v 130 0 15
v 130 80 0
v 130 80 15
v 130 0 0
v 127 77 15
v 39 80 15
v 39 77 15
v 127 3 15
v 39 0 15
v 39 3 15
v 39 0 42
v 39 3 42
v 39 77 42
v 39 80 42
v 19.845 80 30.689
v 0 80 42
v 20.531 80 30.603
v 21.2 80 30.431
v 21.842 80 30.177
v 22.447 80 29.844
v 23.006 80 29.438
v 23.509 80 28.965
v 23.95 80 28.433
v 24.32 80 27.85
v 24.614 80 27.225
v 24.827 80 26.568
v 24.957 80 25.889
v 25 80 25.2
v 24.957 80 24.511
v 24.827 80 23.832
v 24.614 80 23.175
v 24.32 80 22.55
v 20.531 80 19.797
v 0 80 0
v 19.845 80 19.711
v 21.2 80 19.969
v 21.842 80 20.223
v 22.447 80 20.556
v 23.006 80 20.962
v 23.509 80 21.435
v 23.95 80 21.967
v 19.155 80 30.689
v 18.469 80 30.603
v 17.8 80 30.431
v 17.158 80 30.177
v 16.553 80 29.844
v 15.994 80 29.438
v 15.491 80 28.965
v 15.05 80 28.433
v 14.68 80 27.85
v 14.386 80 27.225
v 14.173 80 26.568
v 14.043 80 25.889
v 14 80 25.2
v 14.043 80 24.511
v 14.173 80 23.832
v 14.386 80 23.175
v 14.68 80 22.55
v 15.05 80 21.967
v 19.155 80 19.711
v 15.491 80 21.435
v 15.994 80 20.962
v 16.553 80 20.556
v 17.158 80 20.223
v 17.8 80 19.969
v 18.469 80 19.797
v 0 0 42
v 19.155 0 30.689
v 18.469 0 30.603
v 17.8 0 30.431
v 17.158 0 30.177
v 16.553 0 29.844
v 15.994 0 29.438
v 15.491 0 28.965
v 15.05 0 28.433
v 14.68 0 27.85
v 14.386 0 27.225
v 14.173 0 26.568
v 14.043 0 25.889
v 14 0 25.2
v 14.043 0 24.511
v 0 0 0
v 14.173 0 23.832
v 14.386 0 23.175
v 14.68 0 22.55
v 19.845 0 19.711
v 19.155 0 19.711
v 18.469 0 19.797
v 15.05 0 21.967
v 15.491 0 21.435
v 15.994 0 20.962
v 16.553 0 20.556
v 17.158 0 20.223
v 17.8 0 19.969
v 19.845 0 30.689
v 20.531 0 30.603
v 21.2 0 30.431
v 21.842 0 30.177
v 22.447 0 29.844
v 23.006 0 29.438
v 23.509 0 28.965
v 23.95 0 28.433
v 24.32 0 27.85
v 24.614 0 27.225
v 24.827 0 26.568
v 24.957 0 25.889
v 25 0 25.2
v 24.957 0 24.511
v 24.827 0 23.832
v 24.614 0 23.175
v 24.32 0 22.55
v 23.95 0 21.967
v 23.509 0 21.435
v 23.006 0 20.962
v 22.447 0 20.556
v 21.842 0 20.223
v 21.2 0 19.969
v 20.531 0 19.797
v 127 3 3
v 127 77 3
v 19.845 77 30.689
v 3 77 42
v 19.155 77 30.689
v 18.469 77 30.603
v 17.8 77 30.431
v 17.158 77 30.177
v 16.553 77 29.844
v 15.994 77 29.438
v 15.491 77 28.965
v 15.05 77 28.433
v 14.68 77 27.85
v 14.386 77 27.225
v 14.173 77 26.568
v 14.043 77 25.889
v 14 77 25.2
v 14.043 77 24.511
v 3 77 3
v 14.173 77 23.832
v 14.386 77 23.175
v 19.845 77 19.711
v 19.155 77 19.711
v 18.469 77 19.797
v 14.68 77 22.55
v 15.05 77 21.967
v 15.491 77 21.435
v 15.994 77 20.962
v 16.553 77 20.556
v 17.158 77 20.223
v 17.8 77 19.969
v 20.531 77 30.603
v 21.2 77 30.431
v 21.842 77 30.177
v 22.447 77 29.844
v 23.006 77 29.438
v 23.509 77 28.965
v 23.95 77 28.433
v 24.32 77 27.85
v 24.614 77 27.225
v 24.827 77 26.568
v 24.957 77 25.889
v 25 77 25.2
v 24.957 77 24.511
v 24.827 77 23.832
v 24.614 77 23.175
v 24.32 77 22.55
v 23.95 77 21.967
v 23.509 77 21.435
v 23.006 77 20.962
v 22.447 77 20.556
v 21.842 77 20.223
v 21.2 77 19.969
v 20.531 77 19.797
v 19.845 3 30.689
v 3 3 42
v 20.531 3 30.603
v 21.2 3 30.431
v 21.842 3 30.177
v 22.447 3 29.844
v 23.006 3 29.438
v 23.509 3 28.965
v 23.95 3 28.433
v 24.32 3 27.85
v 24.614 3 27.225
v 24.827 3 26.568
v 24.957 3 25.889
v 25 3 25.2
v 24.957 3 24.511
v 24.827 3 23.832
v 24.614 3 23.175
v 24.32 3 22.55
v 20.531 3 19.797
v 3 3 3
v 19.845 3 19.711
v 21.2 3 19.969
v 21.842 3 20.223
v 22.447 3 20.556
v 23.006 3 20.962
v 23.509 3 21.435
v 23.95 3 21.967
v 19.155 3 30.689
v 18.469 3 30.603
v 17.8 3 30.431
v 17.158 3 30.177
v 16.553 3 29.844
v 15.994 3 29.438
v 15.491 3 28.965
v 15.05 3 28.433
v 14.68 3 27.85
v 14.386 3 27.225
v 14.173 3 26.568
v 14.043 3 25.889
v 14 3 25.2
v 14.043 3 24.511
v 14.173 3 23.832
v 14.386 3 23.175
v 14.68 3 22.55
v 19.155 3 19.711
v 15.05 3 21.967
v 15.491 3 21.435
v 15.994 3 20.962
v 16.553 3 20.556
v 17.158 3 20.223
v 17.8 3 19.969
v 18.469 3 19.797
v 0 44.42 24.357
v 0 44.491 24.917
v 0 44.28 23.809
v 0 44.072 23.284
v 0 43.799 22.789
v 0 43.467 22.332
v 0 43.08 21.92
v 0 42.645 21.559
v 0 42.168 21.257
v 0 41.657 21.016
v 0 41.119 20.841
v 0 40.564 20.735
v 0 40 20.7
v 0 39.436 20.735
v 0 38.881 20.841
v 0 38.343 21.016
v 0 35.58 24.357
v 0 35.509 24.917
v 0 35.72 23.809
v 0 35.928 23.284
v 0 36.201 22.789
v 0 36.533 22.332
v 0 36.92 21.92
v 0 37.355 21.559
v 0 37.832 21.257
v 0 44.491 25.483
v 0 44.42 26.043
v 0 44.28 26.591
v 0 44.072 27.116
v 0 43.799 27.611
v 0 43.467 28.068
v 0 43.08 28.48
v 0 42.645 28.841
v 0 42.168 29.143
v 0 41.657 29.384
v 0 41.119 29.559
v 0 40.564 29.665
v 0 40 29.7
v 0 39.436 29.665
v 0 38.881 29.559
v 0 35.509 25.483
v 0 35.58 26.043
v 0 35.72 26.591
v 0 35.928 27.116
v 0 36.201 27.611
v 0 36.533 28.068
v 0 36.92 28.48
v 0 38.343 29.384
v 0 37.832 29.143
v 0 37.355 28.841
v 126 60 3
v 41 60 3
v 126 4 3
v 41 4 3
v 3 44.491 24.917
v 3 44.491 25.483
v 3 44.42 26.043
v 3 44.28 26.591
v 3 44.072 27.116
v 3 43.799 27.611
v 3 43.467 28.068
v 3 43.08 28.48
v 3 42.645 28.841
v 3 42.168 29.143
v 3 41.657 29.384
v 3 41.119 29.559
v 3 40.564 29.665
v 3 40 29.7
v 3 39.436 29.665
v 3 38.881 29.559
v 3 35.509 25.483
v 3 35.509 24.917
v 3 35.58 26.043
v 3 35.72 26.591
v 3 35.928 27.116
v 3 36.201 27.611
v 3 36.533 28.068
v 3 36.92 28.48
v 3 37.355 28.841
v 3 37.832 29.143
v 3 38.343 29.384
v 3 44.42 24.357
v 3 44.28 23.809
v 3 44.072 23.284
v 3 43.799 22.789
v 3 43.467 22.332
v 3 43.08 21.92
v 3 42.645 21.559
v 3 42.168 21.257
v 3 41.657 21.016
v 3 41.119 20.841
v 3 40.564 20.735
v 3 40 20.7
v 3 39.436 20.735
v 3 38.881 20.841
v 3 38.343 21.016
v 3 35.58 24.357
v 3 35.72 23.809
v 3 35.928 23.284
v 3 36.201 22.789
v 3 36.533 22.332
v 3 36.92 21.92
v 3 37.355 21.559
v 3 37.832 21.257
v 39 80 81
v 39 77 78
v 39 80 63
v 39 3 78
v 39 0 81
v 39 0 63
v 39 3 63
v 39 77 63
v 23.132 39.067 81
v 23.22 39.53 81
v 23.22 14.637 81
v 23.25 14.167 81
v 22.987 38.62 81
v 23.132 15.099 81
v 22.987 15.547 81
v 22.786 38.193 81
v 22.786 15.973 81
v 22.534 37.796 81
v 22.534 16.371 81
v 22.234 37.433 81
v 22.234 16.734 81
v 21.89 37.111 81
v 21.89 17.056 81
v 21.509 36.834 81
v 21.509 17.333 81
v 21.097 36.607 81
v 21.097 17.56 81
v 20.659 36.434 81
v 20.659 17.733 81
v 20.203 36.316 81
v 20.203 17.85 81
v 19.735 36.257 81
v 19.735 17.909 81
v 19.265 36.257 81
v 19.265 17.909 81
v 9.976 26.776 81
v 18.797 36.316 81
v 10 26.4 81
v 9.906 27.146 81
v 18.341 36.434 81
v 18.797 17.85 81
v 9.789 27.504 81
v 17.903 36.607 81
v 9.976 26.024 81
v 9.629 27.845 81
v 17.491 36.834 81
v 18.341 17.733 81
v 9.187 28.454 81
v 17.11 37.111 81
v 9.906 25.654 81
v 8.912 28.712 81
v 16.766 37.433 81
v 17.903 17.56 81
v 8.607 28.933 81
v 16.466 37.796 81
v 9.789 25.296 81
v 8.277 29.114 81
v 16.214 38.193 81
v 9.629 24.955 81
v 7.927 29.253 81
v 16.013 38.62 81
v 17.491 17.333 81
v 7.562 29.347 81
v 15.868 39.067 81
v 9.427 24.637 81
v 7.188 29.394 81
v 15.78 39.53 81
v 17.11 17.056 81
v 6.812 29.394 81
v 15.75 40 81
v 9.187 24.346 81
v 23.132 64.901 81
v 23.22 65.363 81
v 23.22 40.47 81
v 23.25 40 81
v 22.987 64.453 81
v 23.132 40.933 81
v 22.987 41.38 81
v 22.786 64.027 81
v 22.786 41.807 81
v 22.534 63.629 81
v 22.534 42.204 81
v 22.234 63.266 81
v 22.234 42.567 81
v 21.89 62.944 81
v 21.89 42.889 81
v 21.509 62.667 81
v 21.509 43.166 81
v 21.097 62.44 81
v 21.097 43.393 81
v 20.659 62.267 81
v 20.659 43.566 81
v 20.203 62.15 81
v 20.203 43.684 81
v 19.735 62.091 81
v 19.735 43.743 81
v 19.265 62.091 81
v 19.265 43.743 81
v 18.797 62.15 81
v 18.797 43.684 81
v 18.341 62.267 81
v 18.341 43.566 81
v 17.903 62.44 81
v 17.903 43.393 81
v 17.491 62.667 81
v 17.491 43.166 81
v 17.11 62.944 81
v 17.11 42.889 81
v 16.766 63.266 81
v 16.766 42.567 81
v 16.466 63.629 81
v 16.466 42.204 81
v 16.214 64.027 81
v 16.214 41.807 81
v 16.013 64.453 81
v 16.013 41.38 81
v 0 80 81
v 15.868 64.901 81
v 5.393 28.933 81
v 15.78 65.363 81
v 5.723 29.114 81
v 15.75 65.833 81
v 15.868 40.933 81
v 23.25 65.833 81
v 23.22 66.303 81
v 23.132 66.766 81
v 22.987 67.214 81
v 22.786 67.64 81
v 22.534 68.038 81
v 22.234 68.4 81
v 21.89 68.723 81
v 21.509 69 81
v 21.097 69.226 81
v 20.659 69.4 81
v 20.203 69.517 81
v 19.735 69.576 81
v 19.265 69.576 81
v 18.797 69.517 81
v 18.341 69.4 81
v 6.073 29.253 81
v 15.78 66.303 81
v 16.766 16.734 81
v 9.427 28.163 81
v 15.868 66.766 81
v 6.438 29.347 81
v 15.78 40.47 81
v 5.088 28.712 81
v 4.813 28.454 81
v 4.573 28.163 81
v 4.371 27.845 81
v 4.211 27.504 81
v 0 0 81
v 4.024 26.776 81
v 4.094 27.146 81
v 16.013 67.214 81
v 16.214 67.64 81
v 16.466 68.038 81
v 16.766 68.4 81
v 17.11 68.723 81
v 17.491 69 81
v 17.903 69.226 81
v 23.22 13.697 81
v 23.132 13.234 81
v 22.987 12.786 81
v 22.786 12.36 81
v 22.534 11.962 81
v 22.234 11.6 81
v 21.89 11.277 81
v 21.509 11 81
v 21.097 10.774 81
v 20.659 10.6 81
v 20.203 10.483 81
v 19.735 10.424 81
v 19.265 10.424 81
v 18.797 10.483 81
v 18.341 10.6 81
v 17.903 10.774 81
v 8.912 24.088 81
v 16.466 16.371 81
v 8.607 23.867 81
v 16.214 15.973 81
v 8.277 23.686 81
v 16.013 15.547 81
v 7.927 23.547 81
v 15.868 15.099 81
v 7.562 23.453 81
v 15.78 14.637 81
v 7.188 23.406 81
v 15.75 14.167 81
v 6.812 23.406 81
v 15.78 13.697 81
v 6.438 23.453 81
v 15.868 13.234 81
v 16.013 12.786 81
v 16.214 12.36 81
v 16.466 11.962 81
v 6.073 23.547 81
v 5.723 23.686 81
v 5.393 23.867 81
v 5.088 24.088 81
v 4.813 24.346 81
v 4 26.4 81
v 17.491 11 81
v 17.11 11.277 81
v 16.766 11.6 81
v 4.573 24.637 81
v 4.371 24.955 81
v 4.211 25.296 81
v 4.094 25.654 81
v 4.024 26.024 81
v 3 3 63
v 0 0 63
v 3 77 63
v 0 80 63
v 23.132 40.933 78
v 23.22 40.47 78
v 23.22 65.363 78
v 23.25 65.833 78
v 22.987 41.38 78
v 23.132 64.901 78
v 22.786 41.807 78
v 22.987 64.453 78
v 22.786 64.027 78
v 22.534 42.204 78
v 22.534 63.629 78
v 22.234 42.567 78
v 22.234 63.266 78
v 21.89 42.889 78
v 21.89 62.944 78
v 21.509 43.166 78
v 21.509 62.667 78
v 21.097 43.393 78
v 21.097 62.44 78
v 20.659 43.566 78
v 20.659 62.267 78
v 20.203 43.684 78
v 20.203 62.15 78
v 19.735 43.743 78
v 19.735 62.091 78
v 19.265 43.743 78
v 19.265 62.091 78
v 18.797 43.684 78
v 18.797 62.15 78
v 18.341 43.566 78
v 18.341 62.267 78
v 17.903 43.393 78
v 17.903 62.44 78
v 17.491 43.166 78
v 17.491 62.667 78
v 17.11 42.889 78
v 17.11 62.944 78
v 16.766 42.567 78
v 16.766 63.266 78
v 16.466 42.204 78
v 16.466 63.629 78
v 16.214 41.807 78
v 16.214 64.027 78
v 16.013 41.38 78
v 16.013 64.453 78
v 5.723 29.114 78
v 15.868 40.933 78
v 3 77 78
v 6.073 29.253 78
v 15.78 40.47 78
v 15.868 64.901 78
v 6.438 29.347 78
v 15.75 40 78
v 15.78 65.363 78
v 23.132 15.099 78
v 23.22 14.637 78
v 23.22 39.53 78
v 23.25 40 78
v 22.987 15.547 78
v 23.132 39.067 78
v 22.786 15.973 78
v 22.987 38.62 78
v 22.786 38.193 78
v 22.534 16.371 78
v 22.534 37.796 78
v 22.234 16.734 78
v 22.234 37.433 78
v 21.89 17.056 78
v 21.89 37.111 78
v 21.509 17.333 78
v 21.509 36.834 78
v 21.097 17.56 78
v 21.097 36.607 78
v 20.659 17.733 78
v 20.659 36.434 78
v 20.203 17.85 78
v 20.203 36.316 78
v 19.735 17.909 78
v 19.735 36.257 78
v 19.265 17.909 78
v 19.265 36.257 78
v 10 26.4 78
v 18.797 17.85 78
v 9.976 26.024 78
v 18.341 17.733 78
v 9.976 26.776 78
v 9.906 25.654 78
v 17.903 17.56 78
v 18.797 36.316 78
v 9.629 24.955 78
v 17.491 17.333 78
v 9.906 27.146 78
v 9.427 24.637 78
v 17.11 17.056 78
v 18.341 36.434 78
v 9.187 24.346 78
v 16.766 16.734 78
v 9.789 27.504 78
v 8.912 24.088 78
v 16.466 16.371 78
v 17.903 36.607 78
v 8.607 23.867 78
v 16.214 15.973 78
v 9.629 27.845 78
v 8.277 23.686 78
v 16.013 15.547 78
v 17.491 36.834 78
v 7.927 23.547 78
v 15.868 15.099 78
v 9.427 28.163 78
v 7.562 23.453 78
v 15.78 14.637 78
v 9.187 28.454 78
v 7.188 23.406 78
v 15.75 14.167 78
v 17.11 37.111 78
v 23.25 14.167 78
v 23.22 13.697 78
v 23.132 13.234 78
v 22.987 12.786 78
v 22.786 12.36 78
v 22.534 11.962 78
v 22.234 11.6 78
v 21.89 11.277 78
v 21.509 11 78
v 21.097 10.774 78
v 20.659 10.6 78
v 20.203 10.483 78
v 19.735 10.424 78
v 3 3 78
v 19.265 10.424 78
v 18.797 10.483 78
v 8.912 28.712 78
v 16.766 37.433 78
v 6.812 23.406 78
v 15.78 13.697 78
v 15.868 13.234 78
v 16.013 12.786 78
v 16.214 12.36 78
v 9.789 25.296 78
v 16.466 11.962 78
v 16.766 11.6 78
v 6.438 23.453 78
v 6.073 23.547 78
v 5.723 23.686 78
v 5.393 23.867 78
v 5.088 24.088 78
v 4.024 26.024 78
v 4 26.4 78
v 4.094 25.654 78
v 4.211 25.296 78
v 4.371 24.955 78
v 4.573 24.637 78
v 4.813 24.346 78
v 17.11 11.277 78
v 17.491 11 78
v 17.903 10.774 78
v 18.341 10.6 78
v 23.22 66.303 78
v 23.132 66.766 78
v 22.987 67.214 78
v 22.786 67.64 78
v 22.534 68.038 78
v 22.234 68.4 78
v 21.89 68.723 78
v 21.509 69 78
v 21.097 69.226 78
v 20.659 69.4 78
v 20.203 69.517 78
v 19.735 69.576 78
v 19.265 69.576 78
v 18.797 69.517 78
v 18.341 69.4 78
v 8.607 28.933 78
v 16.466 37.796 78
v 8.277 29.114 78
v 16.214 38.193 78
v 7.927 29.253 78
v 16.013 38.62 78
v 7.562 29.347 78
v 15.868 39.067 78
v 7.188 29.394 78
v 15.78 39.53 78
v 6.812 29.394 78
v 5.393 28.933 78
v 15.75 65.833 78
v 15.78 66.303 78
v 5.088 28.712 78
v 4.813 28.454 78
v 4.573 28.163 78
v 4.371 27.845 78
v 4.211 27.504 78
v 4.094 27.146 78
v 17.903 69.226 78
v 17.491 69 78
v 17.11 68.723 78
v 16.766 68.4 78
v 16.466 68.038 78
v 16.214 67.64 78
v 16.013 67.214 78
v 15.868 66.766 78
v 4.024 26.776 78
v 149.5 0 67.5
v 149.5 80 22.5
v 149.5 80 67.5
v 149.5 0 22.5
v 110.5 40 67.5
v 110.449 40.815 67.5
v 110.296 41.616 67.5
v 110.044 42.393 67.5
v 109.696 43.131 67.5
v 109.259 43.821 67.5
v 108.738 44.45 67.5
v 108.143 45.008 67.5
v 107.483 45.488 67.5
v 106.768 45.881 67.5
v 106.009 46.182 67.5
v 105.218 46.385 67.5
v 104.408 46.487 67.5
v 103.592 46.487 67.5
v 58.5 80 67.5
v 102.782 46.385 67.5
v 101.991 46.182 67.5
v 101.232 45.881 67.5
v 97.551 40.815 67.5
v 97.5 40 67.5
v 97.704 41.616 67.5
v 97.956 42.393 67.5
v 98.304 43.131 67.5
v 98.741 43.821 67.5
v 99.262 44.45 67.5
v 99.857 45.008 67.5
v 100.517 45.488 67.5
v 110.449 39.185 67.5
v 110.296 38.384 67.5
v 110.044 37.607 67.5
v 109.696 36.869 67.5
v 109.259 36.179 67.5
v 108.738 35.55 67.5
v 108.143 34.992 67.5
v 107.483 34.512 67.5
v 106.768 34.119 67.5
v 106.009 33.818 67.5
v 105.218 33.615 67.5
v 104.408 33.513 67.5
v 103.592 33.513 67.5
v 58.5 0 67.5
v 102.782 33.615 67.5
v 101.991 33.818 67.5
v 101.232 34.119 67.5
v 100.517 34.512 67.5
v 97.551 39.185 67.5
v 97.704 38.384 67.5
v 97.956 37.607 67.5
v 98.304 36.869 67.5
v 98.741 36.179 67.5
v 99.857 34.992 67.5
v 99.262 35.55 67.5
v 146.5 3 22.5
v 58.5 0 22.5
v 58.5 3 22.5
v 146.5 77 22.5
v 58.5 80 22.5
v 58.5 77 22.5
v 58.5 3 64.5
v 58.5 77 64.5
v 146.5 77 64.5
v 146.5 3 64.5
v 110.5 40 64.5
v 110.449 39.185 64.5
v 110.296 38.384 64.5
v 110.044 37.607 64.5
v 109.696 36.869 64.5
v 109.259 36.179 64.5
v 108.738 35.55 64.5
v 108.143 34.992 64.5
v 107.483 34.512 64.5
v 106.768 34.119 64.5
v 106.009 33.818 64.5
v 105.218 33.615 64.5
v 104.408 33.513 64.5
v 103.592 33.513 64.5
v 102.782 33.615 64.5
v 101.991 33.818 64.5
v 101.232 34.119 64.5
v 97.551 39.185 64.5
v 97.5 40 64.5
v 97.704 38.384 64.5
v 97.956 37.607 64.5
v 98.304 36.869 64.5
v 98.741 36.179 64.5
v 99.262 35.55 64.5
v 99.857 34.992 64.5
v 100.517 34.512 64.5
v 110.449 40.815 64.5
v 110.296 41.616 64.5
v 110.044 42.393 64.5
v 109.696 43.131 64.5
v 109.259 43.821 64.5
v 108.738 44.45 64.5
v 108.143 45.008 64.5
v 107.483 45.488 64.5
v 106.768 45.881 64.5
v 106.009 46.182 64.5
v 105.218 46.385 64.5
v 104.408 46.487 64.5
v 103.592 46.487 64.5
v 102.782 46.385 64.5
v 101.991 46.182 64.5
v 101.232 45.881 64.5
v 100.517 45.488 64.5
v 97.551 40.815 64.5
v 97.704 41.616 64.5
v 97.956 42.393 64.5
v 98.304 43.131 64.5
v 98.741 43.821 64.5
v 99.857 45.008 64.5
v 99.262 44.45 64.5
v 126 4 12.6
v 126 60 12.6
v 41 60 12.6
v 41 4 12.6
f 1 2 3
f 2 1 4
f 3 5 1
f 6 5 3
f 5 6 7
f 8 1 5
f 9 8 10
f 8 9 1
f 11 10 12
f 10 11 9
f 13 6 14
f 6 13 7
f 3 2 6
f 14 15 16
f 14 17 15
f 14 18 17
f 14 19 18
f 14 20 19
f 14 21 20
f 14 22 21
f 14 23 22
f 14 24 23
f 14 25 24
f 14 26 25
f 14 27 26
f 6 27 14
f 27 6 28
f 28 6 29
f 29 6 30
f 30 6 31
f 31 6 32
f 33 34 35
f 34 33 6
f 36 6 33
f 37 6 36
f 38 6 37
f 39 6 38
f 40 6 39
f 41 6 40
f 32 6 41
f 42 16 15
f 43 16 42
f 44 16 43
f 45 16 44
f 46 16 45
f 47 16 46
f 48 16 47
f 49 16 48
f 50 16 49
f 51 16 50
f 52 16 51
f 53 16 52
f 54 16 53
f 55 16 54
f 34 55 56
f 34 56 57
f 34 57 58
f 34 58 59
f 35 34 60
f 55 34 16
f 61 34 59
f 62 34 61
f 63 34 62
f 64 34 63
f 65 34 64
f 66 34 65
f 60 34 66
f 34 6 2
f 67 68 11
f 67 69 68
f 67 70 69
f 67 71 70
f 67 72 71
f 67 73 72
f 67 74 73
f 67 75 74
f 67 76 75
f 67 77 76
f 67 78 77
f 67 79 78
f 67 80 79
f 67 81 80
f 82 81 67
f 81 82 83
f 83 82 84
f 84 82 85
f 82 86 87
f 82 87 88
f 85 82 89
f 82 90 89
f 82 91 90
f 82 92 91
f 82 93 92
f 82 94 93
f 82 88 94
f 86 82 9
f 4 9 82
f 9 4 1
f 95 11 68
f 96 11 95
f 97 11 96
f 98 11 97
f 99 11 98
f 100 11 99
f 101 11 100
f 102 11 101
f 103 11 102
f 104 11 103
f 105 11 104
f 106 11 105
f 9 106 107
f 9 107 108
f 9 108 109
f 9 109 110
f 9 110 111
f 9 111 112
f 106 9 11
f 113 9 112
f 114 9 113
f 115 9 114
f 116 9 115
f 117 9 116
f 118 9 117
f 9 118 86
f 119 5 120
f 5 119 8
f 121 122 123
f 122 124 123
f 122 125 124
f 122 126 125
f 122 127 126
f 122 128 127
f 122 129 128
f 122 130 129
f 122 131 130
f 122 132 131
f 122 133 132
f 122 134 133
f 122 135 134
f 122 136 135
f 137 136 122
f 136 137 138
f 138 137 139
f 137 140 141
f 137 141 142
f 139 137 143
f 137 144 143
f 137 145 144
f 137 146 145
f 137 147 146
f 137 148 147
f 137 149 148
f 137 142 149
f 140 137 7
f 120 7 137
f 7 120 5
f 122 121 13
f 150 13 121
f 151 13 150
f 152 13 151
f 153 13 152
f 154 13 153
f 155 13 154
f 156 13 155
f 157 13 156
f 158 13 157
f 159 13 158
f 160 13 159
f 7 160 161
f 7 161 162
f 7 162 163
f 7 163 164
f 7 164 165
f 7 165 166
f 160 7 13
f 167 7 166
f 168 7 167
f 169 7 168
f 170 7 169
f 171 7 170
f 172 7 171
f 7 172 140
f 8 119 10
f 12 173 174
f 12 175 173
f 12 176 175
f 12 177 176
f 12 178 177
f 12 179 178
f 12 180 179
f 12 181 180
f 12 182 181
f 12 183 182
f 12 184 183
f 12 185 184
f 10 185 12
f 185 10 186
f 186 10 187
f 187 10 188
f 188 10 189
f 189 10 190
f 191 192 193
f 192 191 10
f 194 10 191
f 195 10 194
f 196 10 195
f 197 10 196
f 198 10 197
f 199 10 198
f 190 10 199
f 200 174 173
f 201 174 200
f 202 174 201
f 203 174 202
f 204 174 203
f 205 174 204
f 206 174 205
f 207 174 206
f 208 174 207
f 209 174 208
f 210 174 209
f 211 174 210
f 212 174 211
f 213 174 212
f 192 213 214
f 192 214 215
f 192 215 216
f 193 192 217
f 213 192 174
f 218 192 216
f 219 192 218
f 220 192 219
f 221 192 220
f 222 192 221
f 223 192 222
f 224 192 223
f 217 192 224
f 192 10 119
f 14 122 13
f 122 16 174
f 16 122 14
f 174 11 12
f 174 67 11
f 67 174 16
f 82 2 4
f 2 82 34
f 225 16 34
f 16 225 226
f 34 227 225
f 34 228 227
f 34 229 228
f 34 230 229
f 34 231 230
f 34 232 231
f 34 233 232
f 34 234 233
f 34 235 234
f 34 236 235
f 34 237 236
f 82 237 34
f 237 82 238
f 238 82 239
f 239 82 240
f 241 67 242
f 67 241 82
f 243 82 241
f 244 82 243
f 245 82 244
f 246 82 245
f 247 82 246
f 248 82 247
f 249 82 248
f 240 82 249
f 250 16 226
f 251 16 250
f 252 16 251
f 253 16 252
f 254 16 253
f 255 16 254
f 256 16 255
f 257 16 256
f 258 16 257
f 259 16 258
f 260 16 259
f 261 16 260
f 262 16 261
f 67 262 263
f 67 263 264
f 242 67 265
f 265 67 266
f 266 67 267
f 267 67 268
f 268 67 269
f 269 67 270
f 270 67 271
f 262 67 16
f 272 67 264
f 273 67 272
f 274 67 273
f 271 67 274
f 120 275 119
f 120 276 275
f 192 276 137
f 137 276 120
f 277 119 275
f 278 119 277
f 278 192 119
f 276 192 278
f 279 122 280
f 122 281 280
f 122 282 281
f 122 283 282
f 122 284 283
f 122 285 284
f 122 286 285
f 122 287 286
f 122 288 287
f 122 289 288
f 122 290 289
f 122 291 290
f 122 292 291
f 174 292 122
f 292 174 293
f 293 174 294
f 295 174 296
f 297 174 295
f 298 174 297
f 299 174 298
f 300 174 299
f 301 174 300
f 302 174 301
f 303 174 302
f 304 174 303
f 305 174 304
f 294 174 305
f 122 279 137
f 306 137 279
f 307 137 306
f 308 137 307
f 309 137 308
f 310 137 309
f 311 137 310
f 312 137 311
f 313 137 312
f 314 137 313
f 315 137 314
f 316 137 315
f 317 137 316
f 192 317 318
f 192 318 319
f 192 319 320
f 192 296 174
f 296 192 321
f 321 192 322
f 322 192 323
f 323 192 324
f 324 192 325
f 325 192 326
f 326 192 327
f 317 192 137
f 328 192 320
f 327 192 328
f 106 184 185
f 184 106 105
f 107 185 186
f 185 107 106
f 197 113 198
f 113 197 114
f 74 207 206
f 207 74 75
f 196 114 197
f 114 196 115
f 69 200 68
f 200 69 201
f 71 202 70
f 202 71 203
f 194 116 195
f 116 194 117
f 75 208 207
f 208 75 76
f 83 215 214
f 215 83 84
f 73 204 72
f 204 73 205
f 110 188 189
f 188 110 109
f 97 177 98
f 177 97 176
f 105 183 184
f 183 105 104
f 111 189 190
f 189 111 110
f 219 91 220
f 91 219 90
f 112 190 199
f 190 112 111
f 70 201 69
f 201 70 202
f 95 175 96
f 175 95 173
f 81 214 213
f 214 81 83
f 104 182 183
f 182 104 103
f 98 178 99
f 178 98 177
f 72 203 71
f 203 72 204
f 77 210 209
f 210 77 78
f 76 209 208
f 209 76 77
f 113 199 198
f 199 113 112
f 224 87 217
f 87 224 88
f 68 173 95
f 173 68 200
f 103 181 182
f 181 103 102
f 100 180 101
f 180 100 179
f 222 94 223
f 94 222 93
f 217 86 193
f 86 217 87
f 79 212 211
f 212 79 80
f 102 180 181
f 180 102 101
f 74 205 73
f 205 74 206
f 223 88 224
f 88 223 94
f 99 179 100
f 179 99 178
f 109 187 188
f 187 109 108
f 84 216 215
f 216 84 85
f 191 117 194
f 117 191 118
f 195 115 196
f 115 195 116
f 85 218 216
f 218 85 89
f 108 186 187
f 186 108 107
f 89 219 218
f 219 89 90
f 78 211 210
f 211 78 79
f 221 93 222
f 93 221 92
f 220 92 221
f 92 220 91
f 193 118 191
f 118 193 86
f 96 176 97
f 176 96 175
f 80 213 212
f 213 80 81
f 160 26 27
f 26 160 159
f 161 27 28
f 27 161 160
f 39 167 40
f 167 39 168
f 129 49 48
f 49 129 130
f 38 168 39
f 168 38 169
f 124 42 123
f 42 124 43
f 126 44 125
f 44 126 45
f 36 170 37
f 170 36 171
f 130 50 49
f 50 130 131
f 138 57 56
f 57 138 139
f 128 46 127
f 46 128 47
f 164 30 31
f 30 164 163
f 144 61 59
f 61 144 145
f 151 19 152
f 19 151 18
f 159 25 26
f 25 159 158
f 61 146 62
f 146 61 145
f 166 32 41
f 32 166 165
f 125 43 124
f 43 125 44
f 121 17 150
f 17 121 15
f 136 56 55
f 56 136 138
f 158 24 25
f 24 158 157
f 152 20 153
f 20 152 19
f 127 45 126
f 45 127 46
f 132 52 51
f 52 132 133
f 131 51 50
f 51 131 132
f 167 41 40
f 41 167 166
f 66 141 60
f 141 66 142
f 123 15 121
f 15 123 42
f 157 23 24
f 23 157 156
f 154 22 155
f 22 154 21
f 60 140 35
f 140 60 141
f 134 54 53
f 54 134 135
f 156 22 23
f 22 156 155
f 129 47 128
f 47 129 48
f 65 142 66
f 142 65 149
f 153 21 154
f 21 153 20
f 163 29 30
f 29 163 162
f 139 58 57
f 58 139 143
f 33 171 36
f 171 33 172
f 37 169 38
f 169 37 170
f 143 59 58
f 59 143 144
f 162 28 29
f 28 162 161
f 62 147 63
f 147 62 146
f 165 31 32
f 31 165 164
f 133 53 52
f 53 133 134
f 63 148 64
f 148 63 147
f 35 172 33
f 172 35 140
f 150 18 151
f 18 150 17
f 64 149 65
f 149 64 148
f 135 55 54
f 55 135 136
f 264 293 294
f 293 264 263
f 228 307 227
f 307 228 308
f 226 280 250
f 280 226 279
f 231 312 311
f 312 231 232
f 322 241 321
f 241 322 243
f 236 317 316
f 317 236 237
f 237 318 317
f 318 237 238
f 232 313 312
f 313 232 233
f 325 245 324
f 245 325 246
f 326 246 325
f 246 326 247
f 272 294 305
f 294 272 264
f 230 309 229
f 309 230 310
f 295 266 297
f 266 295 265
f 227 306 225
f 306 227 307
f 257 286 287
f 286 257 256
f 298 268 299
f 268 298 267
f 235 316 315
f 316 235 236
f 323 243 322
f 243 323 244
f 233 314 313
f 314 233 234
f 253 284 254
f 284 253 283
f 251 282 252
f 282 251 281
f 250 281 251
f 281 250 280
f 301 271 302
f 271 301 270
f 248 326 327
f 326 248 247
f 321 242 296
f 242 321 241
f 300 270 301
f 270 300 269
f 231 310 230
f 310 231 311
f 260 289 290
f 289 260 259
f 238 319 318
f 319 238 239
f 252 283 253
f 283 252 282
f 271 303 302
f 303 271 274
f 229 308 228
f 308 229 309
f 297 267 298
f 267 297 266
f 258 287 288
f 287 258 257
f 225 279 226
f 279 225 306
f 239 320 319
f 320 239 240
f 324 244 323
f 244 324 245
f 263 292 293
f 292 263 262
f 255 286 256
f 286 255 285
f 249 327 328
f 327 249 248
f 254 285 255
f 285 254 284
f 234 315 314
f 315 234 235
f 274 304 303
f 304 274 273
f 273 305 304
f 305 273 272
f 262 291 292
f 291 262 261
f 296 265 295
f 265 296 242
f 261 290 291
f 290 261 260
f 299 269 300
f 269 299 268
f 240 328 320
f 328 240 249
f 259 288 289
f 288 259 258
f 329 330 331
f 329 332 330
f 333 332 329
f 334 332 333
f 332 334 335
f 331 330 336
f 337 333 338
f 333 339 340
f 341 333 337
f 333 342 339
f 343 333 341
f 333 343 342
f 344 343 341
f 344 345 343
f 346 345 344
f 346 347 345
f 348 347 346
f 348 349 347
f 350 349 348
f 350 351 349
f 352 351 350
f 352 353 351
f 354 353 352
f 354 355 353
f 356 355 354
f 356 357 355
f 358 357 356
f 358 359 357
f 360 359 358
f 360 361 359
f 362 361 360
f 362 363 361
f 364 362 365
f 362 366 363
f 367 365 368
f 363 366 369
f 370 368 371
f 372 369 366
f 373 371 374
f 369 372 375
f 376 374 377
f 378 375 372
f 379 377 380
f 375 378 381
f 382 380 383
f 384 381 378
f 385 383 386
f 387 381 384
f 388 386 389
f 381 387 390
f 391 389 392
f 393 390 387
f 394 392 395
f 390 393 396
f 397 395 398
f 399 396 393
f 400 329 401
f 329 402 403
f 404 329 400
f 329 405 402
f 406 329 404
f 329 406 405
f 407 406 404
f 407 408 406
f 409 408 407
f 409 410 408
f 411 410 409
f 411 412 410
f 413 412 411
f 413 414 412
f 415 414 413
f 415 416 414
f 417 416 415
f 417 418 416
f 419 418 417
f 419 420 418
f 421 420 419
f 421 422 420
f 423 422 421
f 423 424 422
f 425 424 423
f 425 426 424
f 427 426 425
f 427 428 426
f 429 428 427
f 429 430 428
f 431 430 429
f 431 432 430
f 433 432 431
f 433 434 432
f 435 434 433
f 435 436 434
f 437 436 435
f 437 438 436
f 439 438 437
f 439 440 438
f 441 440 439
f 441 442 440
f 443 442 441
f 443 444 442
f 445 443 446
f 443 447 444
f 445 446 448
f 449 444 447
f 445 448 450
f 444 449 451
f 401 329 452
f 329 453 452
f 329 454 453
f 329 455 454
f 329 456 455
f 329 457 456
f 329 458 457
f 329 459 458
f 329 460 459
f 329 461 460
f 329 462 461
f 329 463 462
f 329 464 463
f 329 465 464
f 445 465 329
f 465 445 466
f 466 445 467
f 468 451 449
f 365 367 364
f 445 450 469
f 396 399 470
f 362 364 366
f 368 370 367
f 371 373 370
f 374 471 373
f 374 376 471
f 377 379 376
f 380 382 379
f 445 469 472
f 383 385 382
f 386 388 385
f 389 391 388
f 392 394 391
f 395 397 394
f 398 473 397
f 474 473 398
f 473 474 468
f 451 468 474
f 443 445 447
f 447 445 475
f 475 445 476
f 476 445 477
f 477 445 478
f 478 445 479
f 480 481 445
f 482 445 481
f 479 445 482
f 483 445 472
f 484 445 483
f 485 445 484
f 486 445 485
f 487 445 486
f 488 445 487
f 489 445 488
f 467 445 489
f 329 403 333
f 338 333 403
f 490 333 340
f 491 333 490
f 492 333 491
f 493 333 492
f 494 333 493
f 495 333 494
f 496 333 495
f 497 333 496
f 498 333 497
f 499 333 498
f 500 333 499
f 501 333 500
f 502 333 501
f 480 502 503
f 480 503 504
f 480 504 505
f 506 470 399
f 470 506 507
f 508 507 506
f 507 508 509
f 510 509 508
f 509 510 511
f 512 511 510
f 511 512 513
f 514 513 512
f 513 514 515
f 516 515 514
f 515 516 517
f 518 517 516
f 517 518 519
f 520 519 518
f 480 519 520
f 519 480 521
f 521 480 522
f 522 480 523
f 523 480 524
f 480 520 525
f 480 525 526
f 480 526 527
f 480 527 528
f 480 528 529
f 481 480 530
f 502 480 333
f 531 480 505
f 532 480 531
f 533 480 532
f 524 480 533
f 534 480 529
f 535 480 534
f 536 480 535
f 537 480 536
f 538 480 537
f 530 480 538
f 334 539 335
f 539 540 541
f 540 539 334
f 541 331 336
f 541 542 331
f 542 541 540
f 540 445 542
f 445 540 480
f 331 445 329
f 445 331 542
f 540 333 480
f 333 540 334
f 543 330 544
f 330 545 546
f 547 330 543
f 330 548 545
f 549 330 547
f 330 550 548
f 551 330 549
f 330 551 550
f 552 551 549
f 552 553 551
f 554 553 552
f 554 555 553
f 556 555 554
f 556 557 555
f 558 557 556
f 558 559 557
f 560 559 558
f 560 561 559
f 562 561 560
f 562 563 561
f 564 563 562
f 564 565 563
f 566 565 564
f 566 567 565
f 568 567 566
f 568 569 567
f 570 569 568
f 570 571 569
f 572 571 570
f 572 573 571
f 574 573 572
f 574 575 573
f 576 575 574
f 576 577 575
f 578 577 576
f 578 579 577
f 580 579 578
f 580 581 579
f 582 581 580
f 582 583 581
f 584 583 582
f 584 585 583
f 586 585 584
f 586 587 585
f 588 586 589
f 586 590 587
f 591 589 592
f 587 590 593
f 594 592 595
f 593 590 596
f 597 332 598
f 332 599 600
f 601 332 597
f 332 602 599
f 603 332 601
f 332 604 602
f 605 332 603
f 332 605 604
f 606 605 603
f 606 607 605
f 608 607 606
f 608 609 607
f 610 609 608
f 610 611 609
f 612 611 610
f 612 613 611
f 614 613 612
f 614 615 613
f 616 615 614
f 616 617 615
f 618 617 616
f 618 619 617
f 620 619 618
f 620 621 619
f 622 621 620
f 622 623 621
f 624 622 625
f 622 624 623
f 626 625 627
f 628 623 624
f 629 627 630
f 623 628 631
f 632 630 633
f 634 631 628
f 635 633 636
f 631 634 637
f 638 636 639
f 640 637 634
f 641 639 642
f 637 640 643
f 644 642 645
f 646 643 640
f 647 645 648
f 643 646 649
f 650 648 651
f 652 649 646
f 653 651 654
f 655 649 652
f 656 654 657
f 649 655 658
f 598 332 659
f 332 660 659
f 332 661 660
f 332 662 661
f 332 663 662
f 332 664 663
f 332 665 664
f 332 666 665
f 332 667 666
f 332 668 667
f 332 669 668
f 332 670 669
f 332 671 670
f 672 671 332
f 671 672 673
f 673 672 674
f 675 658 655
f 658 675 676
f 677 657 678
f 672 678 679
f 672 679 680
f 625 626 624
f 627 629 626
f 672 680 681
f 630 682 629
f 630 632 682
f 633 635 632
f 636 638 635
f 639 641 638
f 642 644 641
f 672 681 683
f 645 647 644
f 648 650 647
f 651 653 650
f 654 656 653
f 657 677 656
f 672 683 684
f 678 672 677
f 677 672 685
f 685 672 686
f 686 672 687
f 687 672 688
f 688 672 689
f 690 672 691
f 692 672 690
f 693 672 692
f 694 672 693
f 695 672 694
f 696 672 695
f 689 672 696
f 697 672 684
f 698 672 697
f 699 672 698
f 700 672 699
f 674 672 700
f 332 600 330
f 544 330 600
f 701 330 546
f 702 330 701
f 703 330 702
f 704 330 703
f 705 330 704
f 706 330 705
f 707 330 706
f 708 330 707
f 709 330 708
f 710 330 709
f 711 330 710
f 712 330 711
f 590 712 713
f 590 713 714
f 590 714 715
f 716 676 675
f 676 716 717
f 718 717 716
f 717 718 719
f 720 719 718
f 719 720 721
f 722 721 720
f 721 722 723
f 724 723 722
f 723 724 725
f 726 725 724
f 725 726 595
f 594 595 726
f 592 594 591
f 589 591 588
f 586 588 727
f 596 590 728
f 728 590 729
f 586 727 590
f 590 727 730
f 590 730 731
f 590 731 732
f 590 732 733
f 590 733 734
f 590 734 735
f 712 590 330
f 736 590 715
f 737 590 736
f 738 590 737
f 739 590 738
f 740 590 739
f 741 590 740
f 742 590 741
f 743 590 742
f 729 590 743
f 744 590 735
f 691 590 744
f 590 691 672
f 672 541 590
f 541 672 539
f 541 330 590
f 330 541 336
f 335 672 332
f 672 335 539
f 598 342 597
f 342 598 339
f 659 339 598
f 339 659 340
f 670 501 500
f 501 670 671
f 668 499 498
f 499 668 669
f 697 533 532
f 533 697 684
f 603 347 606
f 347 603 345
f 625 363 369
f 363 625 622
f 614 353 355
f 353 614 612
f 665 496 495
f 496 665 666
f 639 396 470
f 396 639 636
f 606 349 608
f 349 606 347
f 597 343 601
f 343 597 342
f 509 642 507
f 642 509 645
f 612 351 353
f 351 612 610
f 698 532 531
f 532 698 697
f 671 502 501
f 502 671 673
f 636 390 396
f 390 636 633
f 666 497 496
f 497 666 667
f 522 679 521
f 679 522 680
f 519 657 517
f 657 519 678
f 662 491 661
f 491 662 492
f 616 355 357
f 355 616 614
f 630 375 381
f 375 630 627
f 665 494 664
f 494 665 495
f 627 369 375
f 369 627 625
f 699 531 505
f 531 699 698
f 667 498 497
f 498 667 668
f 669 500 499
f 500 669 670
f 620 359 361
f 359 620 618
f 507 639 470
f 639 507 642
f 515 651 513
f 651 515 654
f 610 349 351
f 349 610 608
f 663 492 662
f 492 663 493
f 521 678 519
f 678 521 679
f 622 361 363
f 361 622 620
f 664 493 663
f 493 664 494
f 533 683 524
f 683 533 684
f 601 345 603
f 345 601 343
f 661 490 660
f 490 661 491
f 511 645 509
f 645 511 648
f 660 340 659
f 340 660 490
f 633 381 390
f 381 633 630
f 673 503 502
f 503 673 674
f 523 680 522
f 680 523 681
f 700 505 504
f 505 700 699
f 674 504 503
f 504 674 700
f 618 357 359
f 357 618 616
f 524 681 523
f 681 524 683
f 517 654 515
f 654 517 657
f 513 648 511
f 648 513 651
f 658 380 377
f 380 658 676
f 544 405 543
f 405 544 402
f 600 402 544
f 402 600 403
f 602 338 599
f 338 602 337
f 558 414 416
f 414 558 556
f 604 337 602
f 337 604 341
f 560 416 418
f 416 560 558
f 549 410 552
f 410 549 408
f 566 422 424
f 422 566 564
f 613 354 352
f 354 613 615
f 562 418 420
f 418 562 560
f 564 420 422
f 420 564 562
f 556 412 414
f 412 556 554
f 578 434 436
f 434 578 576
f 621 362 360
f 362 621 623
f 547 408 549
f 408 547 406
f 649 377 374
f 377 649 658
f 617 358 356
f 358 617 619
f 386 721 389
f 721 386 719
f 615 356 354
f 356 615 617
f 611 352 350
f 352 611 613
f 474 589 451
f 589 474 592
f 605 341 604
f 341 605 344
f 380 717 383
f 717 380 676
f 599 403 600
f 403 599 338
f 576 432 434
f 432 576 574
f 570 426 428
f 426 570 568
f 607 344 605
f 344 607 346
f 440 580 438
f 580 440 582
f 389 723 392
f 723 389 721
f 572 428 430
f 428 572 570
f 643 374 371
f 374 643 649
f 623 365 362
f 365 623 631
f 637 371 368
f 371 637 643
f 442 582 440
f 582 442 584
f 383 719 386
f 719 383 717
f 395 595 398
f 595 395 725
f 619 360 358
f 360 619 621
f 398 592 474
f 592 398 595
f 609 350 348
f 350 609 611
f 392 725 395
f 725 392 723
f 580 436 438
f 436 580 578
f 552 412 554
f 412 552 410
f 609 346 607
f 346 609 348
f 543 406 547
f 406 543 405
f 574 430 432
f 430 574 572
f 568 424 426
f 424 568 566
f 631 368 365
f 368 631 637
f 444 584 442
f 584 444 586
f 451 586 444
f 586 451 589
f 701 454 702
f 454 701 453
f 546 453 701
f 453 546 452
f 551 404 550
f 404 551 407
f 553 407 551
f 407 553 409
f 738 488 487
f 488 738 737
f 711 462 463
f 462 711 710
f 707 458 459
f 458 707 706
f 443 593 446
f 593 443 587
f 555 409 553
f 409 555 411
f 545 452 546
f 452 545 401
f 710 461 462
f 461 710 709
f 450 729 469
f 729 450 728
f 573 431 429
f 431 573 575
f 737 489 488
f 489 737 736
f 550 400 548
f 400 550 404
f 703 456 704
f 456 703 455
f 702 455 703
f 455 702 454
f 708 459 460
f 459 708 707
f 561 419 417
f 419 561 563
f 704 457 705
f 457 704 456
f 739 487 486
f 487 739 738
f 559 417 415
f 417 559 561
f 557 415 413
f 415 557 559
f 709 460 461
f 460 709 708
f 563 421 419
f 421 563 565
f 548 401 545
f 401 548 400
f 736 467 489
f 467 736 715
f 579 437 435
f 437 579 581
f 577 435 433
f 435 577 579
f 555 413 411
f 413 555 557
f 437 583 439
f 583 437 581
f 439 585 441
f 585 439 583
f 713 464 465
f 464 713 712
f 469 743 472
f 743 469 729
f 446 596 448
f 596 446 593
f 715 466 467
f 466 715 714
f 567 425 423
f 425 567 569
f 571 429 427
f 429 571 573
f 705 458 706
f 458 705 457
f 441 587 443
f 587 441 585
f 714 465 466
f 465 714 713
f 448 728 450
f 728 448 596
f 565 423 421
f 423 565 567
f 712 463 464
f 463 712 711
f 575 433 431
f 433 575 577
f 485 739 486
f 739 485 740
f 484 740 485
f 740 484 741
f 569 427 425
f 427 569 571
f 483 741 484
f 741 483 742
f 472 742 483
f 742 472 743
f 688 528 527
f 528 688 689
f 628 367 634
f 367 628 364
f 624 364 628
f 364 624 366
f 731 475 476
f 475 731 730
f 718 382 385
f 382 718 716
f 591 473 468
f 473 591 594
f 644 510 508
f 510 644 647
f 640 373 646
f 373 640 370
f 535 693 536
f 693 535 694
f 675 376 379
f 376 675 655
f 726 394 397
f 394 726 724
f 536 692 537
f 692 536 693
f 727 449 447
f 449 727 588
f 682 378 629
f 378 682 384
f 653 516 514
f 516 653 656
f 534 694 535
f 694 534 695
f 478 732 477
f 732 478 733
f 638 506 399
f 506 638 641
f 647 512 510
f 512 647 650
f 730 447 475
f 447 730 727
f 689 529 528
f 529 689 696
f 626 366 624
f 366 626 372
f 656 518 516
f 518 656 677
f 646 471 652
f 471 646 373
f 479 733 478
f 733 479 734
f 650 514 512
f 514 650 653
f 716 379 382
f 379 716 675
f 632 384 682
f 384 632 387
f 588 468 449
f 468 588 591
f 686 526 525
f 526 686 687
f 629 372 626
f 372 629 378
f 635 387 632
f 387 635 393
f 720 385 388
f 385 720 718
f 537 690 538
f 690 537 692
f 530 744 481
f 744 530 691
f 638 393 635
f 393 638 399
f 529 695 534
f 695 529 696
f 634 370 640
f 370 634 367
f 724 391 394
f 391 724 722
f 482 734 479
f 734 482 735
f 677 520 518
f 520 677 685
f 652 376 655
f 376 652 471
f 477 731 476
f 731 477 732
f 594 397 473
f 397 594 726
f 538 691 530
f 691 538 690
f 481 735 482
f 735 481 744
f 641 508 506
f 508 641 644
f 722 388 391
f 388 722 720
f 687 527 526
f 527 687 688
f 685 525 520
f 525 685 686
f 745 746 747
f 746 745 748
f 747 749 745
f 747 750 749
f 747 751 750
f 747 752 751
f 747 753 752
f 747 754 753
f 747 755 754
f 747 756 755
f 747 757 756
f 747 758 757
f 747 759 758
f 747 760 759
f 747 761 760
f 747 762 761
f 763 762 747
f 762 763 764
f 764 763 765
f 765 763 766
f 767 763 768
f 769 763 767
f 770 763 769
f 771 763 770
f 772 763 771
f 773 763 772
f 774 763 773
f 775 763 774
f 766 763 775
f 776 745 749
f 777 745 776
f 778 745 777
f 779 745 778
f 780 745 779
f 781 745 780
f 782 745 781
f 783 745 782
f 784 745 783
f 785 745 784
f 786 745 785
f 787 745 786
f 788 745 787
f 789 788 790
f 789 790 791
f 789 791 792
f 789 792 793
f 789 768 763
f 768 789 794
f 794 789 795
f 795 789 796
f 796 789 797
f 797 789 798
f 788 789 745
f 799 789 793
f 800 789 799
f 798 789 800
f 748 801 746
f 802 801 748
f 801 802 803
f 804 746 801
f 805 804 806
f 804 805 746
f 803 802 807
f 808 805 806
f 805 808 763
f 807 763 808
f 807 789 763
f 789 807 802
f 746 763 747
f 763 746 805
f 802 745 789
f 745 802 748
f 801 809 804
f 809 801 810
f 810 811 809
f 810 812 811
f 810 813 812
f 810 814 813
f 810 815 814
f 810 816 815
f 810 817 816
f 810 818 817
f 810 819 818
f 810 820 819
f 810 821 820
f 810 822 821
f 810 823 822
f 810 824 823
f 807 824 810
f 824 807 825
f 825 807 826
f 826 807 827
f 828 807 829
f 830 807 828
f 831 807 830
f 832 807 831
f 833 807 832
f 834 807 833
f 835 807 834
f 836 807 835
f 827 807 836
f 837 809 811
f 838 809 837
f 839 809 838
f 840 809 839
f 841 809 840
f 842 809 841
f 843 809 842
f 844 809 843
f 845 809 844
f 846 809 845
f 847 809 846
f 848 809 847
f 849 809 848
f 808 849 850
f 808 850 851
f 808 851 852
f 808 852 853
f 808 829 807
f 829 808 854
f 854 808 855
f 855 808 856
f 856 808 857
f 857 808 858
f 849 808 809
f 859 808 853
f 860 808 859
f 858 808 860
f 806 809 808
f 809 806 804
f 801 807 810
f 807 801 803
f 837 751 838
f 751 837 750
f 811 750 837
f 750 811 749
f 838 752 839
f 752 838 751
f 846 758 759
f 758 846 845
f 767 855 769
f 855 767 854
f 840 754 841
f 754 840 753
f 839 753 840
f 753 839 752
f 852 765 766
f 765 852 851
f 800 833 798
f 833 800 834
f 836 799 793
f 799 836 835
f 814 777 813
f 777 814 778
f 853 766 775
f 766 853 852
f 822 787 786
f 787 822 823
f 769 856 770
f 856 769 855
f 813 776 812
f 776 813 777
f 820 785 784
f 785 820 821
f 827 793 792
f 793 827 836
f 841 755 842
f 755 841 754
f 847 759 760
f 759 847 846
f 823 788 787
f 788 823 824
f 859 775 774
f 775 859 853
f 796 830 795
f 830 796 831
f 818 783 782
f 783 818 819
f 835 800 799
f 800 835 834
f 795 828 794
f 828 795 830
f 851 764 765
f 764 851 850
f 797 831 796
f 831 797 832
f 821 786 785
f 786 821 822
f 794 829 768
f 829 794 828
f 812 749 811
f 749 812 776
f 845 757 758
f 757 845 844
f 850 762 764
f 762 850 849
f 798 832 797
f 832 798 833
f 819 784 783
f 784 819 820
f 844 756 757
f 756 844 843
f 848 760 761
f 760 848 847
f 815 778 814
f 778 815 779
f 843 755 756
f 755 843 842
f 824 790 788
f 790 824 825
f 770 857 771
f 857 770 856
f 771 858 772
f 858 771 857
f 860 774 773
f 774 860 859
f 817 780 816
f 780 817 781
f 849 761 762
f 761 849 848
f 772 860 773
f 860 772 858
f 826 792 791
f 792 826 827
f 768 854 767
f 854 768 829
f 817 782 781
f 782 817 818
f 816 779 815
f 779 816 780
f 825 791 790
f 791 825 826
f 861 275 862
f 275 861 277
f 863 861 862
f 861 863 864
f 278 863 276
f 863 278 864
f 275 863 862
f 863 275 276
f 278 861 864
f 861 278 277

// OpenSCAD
/*

    breadboard dimensions (incl. extension tabs)
    length: 85
    width: 56
    height: 9.6
    
    TODO: measure actual potentiometer dimensions
    TODO: measure actual 1/4" jack dimensions
    TODO: measure actual power jack dimensions
    TODO: measure actual knob dimensions
    TODO: measure actual footswitch dimensions
    
    starting point for overall pedal dimensions
    length: 127 // 5 inches
    width: 76   // 3 inches
    height: 80  // ??? inches
    
*/

OVERALL_LENGTH = 130;
OVERALL_WIDTH = 80;             // TODO: consider making wide enough for a 9v battery
OVERALL_HEIGHT = 60; // 80;

WALL_THICKNESS = 3;
TOLERANCE = 1;

PHONE_JACK_OPENING = 10;        // 9.53 actual
POWER_JACK_OPENING = 8;
POT_BODY_DIAMETER = 25;
POT_SHAFT_DIAMETER = 6.5;
FOOTSWITCH_SHAFT_DIAMETER = 12;
KNOB_DIAMETER = 15;             // a guess
LED_DIAMETER = 5;               // a guess
BREADBOARD_LENGTH = 85;

module breadboard(){
    L = 85;
    W = 56;
    H = 9.6;
    cube([L, W, H]);
}

module knob(){
    D = 10; // a guess
    cylinder(r=D/2,h=10);
}

// TODO: base needs some kind of attachment to cover, control panel
module base(){
    
    L = OVERALL_LENGTH;
    W = OVERALL_WIDTH;
    H = OVERALL_HEIGHT - OVERALL_HEIGHT *.3;  // 2/3 the overall height, might need to go lower
    
    difference(){
        cube([L,W,H]);
        
        // carve-out for breadboard, power supply
        translate([WALL_THICKNESS,WALL_THICKNESS,WALL_THICKNESS]){
            cube([L-(WALL_THICKNESS*2), W-(WALL_THICKNESS*2), H]);
        }
        
        // cutout for cover
        translate([L-(OVERALL_LENGTH - (OVERALL_LENGTH * .3)),0,OVERALL_HEIGHT*.25]){
            cover();
        }
        
        // cutout for phone, power jacks
        // TODO: this spacing needs to accomodate actual
        // jack body dimensions
        translate([L*.15,WALL_THICKNESS+1,H*.6]){
            rotate([90,0,0]){
                cylinder(r=(PHONE_JACK_OPENING+TOLERANCE)/2,h=WALL_THICKNESS*2);
            }
        }
        translate([L*.15,W+1,H*.6]){
            rotate([90,0,0]){
                cylinder(r=(PHONE_JACK_OPENING+TOLERANCE)/2,h=WALL_THICKNESS*2);
            }
        }
        translate([-WALL_THICKNESS/2,W/2,H*.6]){
            rotate([0,90,0]){
                cylinder(r=(POWER_JACK_OPENING+TOLERANCE)/2,h=WALL_THICKNESS*2);
            }
        }
    }
}

// TODO: control panel needs some kind of attachment to base
// TODO: consider merging control panel and base
module control_panel(){
    L = OVERALL_LENGTH * .3;    // one-third overall length, might change
    W = OVERALL_WIDTH;
    H = OVERALL_HEIGHT * .3;    // the other third of the height
    
    difference(){
        cube([L,W,H]);
        
        // cutout for pots
        translate([WALL_THICKNESS,WALL_THICKNESS,-1]){
            cube([L,W-(WALL_THICKNESS*2),H-WALL_THICKNESS+1]);
        }
        
        // cutouts for pot shafts
        // TODO: make number of pots dynamic
        translate([L/2,W/3-(POT_BODY_DIAMETER/2),H-WALL_THICKNESS-1]){
            cylinder(r=(POT_SHAFT_DIAMETER+TOLERANCE)/2,h=WALL_THICKNESS*2);
        }
        translate([L/2,W/2,H-WALL_THICKNESS-1]){
            cylinder(r=(POT_SHAFT_DIAMETER+TOLERANCE)/2,h=WALL_THICKNESS*2);
        }
        translate([L/2,(W-W/3)+(POT_BODY_DIAMETER/2),H-WALL_THICKNESS-1]){
            cylinder(r=(POT_SHAFT_DIAMETER+TOLERANCE)/2,h=WALL_THICKNESS*2);
        }
        
        // cutouts for LEDs, etc.
        translate([WALL_THICKNESS*2+TOLERANCE,W*.33,H-WALL_THICKNESS-1]){
            cylinder(r=(LED_DIAMETER+TOLERANCE)/2,h=WALL_THICKNESS*2);
        }
    } 
}

// TODO: cover needs some kind of attachment to base
// TODO: might be cool to angle the cover a bit toward the foot
module cover(){
    L = OVERALL_LENGTH - (OVERALL_LENGTH * .3);
    W = OVERALL_WIDTH;
    H = OVERALL_HEIGHT * .75;    // other 3/4 of the height

    difference(){
        cube([L,W,H]);
        
        // cutout
        translate([-1,WALL_THICKNESS,-1]){
            cube([L-(WALL_THICKNESS)+1,W-(WALL_THICKNESS*2),H-WALL_THICKNESS+1]);
        }
        
        // cutout for footswitch
        translate([L/2,W/2,H-WALL_THICKNESS-1]){
            cylinder(r=(FOOTSWITCH_SHAFT_DIAMETER+TOLERANCE)/2,h=WALL_THICKNESS*2);
        }
    }
}

// preview
$fn=50;

EXPLODE = 1.5;//1.25;

base();

translate([OVERALL_LENGTH-BREADBOARD_LENGTH-WALL_THICKNESS-1,WALL_THICKNESS+1,WALL_THICKNESS]){
    breadboard();
}

translate([0,0,(OVERALL_HEIGHT - (OVERALL_HEIGHT*.3))*EXPLODE]){
    control_panel();
}

translate([(OVERALL_LENGTH*.3)*EXPLODE,0,(OVERALL_HEIGHT*.25)*EXPLODE]){
    cover();
}
